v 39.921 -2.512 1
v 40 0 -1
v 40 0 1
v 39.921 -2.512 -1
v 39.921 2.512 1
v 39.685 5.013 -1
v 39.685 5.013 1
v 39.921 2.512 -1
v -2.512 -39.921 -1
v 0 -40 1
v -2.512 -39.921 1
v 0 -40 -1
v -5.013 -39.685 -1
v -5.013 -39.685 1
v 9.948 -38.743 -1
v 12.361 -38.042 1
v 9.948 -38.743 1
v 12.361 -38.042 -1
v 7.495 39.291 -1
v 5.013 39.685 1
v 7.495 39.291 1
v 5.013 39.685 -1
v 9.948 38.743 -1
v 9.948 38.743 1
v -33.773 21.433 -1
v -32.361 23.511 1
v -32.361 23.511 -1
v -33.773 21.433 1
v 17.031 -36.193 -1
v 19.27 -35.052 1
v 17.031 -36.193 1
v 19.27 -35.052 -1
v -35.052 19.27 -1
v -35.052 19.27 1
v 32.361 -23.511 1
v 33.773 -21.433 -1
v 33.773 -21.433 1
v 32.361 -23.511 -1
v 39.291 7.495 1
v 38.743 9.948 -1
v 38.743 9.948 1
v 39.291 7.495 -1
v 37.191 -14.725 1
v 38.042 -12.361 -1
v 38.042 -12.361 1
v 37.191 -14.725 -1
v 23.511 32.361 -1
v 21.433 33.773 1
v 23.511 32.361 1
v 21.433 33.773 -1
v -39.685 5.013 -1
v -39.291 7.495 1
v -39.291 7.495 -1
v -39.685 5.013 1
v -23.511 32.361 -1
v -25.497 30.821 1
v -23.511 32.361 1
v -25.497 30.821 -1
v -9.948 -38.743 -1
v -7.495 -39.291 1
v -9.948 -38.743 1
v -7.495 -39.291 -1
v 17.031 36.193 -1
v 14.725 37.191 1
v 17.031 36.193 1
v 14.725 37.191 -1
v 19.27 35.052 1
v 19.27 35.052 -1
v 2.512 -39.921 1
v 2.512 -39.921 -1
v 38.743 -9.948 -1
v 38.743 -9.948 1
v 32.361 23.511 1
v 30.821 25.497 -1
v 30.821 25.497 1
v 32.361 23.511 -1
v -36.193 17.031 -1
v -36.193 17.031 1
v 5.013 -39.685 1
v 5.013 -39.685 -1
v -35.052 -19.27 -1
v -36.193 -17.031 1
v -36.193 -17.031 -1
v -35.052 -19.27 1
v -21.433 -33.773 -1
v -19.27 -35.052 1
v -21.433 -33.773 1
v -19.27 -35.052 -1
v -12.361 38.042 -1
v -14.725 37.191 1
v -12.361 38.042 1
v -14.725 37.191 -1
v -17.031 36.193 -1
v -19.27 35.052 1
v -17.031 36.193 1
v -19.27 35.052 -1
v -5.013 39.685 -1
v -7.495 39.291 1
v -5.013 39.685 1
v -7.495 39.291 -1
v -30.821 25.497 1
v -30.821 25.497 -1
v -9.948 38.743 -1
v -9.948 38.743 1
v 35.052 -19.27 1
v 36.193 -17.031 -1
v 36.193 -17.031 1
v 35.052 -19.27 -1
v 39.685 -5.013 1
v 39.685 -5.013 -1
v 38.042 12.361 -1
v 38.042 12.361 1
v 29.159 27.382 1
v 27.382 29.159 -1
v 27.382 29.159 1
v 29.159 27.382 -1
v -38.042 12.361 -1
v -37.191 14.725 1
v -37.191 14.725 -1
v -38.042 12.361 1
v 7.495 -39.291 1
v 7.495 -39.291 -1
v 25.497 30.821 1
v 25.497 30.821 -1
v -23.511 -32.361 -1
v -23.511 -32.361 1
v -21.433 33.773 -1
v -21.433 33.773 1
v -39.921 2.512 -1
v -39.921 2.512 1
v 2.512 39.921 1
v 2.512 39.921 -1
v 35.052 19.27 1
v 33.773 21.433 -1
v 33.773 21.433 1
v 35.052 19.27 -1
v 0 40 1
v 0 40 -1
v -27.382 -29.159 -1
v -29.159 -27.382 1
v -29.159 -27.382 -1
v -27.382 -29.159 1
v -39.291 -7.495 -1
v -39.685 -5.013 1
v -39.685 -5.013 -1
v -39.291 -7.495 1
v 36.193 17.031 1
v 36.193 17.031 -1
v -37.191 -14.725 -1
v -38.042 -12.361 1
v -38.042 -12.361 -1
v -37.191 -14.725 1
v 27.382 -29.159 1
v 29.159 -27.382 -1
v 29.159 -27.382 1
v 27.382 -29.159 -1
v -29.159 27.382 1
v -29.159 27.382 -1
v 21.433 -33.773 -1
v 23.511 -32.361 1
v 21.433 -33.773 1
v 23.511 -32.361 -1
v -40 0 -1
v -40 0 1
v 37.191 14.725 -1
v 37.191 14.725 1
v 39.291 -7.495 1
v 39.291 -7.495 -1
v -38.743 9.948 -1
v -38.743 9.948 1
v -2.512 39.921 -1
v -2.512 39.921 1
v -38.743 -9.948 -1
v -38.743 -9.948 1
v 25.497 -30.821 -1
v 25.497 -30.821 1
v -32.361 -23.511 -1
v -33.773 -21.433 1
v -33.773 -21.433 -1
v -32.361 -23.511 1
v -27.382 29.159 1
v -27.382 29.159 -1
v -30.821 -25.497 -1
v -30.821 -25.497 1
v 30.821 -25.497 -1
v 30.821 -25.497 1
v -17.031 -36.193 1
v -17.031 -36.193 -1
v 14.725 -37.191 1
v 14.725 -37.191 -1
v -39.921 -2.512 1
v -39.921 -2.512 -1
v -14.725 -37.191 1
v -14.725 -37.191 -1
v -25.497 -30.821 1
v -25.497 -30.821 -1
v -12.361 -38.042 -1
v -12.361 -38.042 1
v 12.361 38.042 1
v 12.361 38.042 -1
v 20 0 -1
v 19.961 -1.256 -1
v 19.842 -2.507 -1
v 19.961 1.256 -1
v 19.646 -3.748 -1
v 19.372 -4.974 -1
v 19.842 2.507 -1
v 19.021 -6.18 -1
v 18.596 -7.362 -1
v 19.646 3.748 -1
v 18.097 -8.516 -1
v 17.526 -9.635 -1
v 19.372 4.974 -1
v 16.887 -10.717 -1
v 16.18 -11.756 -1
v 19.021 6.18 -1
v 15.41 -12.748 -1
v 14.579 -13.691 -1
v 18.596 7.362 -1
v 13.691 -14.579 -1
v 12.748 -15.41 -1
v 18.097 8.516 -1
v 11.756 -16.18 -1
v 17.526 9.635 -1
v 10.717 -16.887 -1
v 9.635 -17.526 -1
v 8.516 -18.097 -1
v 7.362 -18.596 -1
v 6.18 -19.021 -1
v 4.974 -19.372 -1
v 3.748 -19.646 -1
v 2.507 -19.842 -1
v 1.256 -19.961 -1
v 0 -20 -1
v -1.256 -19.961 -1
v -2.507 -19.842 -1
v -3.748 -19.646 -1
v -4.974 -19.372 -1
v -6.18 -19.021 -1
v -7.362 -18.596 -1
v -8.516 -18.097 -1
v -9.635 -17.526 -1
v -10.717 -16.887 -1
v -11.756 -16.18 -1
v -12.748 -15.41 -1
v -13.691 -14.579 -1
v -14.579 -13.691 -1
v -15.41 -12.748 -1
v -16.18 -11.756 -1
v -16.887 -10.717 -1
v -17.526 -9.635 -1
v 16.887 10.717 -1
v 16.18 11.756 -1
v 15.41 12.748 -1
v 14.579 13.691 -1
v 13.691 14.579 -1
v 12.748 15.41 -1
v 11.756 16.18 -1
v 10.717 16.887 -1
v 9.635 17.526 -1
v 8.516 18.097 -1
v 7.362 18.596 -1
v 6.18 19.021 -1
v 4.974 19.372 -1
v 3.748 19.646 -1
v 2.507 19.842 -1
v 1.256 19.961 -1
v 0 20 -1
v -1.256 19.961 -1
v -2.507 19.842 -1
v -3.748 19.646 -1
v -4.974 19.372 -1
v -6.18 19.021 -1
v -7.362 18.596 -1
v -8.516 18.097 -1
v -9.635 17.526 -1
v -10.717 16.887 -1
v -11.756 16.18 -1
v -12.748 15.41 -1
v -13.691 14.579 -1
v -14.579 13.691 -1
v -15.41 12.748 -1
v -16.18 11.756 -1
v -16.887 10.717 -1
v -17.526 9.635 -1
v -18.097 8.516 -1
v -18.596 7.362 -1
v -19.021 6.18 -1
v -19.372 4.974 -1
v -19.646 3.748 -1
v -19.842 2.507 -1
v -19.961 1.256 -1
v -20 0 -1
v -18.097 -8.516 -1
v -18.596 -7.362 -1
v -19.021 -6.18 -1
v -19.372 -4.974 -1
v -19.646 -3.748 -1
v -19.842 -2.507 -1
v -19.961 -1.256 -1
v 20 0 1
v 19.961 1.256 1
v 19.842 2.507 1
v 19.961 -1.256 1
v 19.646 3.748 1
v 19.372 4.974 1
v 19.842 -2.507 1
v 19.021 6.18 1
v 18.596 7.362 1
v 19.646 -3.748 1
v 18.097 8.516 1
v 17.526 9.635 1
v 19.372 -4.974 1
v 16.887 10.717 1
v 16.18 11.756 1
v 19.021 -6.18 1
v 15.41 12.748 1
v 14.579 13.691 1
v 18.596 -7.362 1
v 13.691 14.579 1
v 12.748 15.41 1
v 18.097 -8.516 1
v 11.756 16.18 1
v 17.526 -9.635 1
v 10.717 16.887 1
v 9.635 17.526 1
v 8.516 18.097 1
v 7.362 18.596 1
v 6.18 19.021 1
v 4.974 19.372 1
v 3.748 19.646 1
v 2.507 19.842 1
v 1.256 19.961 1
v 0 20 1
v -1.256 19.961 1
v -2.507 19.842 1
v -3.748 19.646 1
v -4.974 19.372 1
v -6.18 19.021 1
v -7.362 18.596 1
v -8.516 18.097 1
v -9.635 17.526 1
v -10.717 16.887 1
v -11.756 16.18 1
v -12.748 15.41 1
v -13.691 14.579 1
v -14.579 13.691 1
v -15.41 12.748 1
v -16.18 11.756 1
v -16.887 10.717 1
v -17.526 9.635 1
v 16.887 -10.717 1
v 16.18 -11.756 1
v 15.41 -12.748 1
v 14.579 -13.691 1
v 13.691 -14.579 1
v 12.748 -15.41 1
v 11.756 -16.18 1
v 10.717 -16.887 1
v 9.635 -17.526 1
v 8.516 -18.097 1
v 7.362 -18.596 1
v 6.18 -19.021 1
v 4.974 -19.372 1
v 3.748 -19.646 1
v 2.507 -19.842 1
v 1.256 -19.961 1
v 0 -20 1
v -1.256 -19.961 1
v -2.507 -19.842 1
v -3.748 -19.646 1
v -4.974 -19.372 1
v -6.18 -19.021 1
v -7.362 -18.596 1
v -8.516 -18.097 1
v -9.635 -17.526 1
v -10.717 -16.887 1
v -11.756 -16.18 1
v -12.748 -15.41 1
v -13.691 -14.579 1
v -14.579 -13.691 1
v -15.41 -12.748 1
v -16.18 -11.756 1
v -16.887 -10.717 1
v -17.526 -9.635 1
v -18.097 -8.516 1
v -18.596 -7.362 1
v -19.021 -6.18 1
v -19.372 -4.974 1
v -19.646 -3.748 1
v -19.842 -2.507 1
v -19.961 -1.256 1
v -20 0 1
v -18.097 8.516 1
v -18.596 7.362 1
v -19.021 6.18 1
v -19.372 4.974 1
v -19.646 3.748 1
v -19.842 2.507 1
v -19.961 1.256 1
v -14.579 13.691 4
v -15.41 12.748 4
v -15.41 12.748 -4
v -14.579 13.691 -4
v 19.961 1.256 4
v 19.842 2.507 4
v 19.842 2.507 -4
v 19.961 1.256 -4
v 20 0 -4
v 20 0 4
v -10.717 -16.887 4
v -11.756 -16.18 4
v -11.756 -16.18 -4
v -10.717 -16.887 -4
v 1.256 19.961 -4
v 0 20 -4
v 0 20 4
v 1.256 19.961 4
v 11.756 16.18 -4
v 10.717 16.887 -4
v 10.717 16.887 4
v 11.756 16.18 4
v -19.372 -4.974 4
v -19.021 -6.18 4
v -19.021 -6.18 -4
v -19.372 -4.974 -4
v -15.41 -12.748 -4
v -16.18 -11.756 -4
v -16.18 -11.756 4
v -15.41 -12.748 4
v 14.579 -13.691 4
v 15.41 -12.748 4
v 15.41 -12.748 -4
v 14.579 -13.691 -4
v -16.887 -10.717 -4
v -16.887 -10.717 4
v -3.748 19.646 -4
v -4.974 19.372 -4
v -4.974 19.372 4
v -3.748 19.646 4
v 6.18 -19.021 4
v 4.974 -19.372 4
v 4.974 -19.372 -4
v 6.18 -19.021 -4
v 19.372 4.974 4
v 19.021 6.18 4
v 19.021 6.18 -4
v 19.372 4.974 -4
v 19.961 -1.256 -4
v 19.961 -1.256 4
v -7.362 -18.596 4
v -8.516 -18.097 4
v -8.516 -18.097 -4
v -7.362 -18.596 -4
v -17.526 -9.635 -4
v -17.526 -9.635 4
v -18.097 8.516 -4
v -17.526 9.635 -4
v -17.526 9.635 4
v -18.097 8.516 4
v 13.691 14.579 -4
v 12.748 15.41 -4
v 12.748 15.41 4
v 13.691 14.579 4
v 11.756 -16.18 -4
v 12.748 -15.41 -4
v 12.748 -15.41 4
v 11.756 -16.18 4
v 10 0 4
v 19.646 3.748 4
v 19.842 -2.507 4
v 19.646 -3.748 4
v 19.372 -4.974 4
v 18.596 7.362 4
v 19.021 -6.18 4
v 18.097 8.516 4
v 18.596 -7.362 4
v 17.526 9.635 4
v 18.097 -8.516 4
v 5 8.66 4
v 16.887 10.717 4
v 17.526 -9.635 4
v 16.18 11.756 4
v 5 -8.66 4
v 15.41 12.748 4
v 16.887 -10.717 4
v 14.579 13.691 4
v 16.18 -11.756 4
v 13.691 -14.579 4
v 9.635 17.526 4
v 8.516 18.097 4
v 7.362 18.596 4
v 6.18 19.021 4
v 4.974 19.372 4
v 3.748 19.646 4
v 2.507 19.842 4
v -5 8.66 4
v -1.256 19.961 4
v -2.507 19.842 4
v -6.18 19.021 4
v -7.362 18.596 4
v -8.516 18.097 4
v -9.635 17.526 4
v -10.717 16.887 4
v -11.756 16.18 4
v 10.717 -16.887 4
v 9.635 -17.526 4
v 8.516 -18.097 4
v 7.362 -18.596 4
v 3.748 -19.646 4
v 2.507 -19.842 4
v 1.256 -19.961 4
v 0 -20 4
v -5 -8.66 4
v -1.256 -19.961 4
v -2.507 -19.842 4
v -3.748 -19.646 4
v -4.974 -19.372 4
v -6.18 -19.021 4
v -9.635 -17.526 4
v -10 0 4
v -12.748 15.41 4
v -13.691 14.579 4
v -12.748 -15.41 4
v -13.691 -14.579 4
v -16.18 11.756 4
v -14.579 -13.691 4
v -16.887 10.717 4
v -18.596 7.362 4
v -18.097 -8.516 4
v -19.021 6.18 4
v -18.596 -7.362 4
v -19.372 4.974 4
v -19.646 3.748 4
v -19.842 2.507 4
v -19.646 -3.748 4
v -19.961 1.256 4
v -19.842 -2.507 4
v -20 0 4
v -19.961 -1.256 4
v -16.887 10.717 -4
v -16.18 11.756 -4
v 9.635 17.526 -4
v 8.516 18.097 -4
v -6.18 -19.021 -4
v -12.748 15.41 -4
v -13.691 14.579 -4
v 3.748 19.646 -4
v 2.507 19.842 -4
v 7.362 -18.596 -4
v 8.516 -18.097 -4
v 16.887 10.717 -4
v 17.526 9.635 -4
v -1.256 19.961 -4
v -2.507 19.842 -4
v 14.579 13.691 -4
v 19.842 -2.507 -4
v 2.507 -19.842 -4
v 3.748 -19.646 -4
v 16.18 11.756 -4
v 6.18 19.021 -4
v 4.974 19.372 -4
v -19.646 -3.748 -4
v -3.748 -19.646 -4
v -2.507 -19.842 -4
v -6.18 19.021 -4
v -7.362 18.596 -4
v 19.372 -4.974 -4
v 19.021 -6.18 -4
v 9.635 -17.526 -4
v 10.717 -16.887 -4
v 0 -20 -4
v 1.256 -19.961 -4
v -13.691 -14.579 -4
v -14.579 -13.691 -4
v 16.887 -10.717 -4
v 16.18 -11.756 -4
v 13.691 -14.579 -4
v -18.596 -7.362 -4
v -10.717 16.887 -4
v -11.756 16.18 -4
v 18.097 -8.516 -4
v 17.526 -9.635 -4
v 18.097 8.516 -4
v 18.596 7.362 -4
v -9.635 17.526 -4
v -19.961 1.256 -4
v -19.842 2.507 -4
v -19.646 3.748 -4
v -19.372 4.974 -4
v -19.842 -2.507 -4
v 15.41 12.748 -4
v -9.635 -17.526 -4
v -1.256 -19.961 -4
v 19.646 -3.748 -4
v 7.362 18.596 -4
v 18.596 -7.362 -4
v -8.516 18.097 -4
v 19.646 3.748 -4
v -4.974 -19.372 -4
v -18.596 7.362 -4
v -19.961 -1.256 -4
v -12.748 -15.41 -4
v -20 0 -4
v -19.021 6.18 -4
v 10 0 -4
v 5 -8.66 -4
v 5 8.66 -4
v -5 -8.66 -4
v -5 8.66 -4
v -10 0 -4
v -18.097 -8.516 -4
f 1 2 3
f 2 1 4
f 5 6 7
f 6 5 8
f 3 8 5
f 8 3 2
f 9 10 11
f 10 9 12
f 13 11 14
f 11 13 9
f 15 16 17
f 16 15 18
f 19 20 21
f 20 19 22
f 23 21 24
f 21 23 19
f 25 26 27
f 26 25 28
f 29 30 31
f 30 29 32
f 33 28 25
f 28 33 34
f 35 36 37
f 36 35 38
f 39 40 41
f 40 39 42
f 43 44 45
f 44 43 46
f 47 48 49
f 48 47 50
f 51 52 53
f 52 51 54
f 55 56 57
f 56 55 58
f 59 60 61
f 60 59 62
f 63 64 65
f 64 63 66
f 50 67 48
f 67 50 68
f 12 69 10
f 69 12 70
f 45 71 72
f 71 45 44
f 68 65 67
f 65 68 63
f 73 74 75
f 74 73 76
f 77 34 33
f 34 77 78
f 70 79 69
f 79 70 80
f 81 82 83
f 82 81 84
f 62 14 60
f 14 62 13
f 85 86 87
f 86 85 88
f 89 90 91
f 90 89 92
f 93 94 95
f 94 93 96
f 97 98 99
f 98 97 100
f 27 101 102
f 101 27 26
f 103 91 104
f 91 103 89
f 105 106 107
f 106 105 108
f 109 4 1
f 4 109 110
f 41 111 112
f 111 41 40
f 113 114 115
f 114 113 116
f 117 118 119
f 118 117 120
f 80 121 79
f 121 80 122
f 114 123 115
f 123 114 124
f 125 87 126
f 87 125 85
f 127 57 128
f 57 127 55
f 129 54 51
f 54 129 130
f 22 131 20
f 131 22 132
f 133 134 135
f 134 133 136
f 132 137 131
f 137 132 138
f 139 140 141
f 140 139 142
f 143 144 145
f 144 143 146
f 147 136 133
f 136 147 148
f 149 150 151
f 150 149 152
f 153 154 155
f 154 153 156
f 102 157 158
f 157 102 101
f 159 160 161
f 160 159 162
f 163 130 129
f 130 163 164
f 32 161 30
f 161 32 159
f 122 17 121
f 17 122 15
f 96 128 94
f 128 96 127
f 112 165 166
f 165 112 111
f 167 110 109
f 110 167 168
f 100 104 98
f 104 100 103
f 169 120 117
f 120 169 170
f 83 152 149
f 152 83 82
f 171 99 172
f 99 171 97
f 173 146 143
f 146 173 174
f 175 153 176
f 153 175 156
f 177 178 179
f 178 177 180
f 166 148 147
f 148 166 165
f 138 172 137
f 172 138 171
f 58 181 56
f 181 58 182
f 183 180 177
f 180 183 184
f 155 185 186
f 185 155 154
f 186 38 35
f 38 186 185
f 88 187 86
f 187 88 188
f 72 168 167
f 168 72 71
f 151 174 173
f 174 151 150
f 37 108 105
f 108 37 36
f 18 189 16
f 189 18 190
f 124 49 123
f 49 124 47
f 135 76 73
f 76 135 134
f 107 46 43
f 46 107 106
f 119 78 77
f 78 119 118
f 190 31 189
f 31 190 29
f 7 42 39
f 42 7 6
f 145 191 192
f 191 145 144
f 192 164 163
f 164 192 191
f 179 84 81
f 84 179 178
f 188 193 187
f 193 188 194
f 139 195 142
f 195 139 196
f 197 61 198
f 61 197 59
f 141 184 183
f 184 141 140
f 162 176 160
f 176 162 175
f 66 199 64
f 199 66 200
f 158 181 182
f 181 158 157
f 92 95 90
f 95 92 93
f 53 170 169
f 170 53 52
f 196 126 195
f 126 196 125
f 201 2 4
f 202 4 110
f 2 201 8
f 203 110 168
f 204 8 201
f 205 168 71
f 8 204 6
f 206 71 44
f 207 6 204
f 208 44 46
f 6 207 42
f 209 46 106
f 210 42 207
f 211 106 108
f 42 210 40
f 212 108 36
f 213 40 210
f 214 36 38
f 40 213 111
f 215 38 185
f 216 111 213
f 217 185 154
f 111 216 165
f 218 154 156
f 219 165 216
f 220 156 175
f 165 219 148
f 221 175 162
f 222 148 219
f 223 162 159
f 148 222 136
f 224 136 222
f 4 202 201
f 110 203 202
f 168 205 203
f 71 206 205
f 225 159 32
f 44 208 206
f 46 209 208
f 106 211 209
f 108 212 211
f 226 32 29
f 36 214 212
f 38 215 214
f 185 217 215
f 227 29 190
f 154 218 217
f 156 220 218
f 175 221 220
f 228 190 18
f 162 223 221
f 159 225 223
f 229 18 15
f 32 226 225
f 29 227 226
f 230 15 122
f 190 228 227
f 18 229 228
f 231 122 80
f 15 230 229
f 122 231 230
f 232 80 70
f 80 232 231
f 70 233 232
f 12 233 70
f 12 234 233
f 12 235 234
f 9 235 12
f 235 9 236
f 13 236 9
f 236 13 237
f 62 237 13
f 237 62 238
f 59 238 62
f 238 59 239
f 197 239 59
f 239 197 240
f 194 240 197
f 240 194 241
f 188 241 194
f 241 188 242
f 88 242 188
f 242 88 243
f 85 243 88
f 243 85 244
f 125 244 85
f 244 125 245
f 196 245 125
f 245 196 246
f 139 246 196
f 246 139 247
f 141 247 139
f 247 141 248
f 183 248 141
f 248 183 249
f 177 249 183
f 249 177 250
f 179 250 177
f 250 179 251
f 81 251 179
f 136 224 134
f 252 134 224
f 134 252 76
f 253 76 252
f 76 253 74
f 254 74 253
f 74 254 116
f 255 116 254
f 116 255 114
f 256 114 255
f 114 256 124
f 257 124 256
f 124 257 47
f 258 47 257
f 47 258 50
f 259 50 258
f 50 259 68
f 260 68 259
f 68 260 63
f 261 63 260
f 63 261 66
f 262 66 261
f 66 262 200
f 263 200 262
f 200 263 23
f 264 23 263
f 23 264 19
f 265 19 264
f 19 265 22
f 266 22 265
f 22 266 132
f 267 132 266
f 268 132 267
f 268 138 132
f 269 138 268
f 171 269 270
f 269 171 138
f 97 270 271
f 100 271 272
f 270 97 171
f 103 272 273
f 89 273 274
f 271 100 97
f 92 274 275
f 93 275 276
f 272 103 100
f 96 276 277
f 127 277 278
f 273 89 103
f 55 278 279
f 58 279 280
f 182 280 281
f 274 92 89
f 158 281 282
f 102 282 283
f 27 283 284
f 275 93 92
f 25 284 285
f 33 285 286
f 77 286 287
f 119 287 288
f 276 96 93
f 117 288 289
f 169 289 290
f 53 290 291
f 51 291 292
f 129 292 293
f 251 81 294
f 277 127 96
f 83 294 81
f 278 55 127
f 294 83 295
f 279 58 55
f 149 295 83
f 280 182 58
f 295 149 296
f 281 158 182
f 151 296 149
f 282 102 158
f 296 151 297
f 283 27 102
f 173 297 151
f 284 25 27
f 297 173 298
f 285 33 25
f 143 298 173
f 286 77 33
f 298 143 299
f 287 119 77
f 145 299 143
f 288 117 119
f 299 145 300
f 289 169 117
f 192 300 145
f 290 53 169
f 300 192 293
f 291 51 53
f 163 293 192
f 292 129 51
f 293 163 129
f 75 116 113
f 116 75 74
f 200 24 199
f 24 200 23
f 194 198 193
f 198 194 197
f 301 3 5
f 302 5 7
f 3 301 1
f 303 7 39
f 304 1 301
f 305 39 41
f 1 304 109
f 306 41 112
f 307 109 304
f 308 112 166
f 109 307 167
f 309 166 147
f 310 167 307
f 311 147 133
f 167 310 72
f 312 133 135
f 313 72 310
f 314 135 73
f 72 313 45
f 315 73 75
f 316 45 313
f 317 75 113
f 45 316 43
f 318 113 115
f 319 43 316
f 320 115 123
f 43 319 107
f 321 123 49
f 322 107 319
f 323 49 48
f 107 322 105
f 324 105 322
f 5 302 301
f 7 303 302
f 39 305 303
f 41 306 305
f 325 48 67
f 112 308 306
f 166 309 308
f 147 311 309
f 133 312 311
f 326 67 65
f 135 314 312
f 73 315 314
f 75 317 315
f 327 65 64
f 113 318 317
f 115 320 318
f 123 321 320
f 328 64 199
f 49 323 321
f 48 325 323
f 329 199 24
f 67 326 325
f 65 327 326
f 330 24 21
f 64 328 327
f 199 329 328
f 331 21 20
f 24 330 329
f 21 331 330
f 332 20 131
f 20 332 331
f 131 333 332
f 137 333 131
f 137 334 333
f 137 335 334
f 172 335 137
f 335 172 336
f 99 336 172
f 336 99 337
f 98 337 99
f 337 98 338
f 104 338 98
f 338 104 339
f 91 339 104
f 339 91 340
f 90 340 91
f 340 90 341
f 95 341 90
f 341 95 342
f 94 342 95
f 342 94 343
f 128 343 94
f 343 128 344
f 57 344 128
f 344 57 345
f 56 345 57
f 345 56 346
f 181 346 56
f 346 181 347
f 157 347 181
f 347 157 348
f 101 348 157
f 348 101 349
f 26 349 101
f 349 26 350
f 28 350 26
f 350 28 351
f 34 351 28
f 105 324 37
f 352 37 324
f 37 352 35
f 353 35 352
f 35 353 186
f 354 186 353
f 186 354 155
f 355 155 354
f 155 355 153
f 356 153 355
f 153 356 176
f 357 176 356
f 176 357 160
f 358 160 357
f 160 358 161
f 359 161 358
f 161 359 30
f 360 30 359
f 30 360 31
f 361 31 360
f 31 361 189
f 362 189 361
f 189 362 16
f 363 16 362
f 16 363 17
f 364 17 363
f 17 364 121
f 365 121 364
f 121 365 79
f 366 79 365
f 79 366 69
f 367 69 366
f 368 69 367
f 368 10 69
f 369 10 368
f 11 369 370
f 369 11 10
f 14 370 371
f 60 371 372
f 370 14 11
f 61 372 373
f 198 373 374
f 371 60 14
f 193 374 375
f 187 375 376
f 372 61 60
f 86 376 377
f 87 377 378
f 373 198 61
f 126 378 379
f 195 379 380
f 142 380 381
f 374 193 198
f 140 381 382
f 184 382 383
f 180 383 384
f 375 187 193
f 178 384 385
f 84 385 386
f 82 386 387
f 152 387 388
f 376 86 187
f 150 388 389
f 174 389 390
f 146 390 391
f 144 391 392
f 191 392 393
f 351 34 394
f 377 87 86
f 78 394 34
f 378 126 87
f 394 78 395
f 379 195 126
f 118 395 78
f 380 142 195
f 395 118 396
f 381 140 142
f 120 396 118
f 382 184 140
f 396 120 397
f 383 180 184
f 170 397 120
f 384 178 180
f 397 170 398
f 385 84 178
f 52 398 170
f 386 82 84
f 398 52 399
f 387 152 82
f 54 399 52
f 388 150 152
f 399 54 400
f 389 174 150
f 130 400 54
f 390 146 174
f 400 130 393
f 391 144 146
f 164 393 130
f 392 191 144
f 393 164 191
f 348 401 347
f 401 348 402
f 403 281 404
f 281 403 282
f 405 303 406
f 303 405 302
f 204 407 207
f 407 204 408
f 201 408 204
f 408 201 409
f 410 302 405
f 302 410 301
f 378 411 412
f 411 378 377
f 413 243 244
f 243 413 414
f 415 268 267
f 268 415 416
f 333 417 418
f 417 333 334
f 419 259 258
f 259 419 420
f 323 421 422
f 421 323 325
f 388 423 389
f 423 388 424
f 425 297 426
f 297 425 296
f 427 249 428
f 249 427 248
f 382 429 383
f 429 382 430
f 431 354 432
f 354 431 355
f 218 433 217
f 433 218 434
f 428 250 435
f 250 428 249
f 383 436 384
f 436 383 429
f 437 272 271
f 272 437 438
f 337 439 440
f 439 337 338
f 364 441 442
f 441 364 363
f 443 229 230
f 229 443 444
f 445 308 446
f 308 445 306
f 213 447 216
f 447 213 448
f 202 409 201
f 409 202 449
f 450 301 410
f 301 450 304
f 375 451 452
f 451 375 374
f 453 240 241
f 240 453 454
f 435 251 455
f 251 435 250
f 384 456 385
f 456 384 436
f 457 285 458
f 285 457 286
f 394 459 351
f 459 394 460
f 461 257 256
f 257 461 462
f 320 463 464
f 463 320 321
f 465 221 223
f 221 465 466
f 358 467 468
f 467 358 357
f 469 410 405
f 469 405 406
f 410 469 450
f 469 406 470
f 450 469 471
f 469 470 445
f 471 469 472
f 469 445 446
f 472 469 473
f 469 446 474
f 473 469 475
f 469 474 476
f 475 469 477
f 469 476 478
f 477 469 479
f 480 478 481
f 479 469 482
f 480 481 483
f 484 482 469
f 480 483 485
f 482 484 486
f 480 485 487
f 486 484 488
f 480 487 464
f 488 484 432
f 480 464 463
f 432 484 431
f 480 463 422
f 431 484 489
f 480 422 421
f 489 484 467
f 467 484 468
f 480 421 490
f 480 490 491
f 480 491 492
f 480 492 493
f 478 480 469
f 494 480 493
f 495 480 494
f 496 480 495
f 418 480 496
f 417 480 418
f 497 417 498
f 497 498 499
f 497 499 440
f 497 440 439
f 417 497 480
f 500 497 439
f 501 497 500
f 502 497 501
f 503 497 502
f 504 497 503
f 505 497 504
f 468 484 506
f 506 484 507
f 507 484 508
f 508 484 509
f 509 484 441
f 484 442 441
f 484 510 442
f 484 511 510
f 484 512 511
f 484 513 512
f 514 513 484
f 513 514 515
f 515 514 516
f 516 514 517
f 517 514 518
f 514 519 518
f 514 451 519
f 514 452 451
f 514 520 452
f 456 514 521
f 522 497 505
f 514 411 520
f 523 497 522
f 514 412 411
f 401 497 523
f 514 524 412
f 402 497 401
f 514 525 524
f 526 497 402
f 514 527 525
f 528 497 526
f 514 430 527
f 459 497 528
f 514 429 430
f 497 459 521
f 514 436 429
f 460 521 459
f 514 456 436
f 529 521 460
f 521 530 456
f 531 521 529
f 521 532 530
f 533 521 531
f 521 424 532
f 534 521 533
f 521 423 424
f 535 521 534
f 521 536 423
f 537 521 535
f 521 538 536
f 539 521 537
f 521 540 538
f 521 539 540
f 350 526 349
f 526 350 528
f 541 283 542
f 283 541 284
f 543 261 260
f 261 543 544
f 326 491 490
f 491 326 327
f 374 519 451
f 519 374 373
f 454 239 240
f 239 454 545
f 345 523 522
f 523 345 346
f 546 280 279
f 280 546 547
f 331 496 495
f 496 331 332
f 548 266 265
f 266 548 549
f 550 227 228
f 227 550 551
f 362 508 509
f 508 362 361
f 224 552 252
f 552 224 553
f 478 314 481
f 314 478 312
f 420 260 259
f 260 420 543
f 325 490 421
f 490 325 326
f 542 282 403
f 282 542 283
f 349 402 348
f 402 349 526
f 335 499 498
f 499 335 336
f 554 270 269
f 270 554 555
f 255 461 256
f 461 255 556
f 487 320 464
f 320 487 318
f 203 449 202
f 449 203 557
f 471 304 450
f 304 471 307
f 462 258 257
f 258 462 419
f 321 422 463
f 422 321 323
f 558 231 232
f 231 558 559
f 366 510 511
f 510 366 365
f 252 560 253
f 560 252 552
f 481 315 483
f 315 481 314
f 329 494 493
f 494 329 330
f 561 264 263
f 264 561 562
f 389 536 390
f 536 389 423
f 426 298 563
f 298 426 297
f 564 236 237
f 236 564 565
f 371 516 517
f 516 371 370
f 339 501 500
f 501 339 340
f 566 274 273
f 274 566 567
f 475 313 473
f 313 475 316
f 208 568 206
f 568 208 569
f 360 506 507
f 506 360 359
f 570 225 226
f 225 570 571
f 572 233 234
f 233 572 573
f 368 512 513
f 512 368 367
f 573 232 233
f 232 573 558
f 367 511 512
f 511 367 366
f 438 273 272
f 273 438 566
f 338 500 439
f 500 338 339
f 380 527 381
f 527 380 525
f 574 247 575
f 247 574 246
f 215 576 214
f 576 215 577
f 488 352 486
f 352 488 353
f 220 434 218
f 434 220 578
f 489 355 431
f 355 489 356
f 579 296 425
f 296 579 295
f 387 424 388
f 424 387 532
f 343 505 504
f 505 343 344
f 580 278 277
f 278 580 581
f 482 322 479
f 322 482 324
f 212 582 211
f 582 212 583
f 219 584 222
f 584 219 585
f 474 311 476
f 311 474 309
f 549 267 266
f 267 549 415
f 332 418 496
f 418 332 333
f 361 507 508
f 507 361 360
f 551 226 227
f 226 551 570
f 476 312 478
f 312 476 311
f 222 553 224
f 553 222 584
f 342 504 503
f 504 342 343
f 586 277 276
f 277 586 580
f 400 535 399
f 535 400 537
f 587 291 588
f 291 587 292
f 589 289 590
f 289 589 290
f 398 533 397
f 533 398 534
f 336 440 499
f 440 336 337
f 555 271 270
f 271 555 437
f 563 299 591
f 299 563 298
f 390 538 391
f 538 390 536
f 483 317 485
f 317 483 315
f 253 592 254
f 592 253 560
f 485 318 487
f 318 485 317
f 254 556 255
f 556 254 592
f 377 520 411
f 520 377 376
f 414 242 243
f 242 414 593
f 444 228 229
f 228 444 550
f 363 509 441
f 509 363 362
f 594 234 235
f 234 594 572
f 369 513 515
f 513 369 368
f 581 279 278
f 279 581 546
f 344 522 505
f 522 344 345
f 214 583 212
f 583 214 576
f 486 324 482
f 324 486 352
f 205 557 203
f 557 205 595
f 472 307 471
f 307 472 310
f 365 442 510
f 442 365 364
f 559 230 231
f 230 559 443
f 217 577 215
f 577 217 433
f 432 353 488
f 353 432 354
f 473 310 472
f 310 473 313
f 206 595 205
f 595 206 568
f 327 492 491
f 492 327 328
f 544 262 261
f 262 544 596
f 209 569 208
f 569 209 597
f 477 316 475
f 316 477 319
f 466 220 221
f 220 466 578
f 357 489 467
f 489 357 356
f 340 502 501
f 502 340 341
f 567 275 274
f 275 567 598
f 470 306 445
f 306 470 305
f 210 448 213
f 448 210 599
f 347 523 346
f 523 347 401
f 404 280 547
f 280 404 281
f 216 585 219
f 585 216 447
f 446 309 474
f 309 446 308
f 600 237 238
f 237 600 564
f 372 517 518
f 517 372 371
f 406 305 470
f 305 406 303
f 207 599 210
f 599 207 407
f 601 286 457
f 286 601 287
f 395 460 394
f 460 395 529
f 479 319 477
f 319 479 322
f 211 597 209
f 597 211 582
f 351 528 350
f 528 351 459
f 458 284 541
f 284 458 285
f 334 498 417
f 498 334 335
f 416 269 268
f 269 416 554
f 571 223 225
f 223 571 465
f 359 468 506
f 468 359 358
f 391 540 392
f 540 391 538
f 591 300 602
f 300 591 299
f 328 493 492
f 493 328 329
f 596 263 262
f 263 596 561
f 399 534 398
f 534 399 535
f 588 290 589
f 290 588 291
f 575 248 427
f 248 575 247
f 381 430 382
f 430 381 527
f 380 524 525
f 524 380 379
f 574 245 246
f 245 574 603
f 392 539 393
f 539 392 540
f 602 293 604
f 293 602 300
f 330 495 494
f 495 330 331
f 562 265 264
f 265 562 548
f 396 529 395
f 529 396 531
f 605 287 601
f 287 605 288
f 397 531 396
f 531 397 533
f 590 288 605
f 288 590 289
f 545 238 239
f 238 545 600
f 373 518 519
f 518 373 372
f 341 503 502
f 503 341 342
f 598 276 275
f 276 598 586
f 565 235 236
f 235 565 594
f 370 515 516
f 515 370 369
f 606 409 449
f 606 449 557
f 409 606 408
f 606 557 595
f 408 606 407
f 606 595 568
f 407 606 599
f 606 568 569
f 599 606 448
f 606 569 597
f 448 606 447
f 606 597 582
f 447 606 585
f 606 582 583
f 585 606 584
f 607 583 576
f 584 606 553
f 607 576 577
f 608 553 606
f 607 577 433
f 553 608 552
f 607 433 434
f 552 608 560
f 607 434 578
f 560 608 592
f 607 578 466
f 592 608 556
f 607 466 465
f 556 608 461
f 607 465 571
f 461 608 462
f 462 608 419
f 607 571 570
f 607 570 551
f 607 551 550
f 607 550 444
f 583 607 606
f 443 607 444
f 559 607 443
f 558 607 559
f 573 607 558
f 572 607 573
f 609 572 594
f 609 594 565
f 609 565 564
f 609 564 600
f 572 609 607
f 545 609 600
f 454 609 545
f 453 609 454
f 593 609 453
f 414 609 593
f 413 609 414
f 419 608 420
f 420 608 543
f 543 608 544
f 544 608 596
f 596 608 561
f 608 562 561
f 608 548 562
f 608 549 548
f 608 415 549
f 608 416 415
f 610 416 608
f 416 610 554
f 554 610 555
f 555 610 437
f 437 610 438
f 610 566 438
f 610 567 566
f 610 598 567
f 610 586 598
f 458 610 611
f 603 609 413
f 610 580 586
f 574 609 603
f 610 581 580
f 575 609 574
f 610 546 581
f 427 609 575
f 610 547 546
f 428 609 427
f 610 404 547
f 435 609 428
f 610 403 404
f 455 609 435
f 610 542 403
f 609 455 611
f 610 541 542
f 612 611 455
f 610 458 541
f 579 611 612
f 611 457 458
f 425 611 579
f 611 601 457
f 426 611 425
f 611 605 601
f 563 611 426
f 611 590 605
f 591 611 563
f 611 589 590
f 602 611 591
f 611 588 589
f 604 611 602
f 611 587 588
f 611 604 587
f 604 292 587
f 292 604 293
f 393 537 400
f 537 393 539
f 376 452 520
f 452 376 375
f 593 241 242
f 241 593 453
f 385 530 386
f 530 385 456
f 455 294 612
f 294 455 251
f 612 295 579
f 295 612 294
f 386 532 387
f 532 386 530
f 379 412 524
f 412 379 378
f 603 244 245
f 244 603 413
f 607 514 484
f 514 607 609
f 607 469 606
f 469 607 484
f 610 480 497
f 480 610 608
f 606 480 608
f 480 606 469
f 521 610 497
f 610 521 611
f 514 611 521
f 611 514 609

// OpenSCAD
//Medidas
radio = 20;
grosor=radio/10;

difference(){
	
	union(){
		//rueda exterior
		cylinder(r=radio*2,h=grosor,$fn=100,center=true);
		//rueda interior
		cylinder(r=radio,h=grosor*4,$fn=100,center=true);
	}
	//taladro
	cylinder(r=radio/2,h=grosor*10,$fn=6,center=true);
	
}
